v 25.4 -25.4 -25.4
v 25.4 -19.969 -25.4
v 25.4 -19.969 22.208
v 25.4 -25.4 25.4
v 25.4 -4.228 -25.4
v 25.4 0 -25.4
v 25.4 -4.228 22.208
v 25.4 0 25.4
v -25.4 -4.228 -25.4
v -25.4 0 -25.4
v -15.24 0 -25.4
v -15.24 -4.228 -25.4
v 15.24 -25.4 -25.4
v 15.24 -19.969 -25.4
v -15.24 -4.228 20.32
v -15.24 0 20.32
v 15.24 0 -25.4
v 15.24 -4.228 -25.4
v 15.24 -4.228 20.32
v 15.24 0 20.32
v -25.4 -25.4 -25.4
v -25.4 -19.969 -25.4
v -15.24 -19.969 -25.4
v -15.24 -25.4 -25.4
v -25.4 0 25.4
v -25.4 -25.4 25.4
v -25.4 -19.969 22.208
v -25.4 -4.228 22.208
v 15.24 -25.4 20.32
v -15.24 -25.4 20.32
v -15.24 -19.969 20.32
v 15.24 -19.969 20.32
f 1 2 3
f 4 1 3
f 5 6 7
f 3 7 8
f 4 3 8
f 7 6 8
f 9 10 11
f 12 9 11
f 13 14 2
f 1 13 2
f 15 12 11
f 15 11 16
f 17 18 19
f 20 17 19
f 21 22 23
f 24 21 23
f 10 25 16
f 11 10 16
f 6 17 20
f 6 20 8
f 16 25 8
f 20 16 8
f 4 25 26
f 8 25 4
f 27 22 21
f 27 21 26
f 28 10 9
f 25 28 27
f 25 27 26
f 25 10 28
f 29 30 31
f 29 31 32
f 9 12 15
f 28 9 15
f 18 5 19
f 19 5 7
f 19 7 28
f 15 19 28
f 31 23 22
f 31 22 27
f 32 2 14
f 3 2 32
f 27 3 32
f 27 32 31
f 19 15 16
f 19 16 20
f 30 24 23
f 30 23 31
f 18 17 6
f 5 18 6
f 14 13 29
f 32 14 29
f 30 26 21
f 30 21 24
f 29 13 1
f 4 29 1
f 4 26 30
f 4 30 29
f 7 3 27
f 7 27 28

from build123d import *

# Parameters (mm, degrees)
F0_W     = 50.8
F0_H     = 50.8
F1_DEPTH = 25.4
F2_W     = 30.48
F2_H     = 45.72
F3_DEPTH = 25.401
F4_W     = 15.741314
F4_H     = 47.608288
F5_DEPTH = 50.801


with BuildPart() as f1:
    # F0 (on Front) → F1 (new body)
    with BuildSketch(Plane.XZ):
        Rectangle(F0_W, F0_H)
    extrude(amount=F1_DEPTH)

    # F2 (on face) → F3 (cut, through all)
    with BuildSketch(Plane.XZ.offset(25.4)):
        with Locations((0, -2.54)):
            Rectangle(F2_W, F2_H)
    extrude(amount=-F3_DEPTH, mode=Mode.SUBTRACT)

    # F4 (on face) → F5 (cut, through all)
    with BuildSketch(Plane.YZ.offset(25.4)):
        with Locations((-12.098421, -1.595856)):
            Rectangle(F4_W, F4_H)
    extrude(amount=-F5_DEPTH, mode=Mode.SUBTRACT)


solid = f1.part
